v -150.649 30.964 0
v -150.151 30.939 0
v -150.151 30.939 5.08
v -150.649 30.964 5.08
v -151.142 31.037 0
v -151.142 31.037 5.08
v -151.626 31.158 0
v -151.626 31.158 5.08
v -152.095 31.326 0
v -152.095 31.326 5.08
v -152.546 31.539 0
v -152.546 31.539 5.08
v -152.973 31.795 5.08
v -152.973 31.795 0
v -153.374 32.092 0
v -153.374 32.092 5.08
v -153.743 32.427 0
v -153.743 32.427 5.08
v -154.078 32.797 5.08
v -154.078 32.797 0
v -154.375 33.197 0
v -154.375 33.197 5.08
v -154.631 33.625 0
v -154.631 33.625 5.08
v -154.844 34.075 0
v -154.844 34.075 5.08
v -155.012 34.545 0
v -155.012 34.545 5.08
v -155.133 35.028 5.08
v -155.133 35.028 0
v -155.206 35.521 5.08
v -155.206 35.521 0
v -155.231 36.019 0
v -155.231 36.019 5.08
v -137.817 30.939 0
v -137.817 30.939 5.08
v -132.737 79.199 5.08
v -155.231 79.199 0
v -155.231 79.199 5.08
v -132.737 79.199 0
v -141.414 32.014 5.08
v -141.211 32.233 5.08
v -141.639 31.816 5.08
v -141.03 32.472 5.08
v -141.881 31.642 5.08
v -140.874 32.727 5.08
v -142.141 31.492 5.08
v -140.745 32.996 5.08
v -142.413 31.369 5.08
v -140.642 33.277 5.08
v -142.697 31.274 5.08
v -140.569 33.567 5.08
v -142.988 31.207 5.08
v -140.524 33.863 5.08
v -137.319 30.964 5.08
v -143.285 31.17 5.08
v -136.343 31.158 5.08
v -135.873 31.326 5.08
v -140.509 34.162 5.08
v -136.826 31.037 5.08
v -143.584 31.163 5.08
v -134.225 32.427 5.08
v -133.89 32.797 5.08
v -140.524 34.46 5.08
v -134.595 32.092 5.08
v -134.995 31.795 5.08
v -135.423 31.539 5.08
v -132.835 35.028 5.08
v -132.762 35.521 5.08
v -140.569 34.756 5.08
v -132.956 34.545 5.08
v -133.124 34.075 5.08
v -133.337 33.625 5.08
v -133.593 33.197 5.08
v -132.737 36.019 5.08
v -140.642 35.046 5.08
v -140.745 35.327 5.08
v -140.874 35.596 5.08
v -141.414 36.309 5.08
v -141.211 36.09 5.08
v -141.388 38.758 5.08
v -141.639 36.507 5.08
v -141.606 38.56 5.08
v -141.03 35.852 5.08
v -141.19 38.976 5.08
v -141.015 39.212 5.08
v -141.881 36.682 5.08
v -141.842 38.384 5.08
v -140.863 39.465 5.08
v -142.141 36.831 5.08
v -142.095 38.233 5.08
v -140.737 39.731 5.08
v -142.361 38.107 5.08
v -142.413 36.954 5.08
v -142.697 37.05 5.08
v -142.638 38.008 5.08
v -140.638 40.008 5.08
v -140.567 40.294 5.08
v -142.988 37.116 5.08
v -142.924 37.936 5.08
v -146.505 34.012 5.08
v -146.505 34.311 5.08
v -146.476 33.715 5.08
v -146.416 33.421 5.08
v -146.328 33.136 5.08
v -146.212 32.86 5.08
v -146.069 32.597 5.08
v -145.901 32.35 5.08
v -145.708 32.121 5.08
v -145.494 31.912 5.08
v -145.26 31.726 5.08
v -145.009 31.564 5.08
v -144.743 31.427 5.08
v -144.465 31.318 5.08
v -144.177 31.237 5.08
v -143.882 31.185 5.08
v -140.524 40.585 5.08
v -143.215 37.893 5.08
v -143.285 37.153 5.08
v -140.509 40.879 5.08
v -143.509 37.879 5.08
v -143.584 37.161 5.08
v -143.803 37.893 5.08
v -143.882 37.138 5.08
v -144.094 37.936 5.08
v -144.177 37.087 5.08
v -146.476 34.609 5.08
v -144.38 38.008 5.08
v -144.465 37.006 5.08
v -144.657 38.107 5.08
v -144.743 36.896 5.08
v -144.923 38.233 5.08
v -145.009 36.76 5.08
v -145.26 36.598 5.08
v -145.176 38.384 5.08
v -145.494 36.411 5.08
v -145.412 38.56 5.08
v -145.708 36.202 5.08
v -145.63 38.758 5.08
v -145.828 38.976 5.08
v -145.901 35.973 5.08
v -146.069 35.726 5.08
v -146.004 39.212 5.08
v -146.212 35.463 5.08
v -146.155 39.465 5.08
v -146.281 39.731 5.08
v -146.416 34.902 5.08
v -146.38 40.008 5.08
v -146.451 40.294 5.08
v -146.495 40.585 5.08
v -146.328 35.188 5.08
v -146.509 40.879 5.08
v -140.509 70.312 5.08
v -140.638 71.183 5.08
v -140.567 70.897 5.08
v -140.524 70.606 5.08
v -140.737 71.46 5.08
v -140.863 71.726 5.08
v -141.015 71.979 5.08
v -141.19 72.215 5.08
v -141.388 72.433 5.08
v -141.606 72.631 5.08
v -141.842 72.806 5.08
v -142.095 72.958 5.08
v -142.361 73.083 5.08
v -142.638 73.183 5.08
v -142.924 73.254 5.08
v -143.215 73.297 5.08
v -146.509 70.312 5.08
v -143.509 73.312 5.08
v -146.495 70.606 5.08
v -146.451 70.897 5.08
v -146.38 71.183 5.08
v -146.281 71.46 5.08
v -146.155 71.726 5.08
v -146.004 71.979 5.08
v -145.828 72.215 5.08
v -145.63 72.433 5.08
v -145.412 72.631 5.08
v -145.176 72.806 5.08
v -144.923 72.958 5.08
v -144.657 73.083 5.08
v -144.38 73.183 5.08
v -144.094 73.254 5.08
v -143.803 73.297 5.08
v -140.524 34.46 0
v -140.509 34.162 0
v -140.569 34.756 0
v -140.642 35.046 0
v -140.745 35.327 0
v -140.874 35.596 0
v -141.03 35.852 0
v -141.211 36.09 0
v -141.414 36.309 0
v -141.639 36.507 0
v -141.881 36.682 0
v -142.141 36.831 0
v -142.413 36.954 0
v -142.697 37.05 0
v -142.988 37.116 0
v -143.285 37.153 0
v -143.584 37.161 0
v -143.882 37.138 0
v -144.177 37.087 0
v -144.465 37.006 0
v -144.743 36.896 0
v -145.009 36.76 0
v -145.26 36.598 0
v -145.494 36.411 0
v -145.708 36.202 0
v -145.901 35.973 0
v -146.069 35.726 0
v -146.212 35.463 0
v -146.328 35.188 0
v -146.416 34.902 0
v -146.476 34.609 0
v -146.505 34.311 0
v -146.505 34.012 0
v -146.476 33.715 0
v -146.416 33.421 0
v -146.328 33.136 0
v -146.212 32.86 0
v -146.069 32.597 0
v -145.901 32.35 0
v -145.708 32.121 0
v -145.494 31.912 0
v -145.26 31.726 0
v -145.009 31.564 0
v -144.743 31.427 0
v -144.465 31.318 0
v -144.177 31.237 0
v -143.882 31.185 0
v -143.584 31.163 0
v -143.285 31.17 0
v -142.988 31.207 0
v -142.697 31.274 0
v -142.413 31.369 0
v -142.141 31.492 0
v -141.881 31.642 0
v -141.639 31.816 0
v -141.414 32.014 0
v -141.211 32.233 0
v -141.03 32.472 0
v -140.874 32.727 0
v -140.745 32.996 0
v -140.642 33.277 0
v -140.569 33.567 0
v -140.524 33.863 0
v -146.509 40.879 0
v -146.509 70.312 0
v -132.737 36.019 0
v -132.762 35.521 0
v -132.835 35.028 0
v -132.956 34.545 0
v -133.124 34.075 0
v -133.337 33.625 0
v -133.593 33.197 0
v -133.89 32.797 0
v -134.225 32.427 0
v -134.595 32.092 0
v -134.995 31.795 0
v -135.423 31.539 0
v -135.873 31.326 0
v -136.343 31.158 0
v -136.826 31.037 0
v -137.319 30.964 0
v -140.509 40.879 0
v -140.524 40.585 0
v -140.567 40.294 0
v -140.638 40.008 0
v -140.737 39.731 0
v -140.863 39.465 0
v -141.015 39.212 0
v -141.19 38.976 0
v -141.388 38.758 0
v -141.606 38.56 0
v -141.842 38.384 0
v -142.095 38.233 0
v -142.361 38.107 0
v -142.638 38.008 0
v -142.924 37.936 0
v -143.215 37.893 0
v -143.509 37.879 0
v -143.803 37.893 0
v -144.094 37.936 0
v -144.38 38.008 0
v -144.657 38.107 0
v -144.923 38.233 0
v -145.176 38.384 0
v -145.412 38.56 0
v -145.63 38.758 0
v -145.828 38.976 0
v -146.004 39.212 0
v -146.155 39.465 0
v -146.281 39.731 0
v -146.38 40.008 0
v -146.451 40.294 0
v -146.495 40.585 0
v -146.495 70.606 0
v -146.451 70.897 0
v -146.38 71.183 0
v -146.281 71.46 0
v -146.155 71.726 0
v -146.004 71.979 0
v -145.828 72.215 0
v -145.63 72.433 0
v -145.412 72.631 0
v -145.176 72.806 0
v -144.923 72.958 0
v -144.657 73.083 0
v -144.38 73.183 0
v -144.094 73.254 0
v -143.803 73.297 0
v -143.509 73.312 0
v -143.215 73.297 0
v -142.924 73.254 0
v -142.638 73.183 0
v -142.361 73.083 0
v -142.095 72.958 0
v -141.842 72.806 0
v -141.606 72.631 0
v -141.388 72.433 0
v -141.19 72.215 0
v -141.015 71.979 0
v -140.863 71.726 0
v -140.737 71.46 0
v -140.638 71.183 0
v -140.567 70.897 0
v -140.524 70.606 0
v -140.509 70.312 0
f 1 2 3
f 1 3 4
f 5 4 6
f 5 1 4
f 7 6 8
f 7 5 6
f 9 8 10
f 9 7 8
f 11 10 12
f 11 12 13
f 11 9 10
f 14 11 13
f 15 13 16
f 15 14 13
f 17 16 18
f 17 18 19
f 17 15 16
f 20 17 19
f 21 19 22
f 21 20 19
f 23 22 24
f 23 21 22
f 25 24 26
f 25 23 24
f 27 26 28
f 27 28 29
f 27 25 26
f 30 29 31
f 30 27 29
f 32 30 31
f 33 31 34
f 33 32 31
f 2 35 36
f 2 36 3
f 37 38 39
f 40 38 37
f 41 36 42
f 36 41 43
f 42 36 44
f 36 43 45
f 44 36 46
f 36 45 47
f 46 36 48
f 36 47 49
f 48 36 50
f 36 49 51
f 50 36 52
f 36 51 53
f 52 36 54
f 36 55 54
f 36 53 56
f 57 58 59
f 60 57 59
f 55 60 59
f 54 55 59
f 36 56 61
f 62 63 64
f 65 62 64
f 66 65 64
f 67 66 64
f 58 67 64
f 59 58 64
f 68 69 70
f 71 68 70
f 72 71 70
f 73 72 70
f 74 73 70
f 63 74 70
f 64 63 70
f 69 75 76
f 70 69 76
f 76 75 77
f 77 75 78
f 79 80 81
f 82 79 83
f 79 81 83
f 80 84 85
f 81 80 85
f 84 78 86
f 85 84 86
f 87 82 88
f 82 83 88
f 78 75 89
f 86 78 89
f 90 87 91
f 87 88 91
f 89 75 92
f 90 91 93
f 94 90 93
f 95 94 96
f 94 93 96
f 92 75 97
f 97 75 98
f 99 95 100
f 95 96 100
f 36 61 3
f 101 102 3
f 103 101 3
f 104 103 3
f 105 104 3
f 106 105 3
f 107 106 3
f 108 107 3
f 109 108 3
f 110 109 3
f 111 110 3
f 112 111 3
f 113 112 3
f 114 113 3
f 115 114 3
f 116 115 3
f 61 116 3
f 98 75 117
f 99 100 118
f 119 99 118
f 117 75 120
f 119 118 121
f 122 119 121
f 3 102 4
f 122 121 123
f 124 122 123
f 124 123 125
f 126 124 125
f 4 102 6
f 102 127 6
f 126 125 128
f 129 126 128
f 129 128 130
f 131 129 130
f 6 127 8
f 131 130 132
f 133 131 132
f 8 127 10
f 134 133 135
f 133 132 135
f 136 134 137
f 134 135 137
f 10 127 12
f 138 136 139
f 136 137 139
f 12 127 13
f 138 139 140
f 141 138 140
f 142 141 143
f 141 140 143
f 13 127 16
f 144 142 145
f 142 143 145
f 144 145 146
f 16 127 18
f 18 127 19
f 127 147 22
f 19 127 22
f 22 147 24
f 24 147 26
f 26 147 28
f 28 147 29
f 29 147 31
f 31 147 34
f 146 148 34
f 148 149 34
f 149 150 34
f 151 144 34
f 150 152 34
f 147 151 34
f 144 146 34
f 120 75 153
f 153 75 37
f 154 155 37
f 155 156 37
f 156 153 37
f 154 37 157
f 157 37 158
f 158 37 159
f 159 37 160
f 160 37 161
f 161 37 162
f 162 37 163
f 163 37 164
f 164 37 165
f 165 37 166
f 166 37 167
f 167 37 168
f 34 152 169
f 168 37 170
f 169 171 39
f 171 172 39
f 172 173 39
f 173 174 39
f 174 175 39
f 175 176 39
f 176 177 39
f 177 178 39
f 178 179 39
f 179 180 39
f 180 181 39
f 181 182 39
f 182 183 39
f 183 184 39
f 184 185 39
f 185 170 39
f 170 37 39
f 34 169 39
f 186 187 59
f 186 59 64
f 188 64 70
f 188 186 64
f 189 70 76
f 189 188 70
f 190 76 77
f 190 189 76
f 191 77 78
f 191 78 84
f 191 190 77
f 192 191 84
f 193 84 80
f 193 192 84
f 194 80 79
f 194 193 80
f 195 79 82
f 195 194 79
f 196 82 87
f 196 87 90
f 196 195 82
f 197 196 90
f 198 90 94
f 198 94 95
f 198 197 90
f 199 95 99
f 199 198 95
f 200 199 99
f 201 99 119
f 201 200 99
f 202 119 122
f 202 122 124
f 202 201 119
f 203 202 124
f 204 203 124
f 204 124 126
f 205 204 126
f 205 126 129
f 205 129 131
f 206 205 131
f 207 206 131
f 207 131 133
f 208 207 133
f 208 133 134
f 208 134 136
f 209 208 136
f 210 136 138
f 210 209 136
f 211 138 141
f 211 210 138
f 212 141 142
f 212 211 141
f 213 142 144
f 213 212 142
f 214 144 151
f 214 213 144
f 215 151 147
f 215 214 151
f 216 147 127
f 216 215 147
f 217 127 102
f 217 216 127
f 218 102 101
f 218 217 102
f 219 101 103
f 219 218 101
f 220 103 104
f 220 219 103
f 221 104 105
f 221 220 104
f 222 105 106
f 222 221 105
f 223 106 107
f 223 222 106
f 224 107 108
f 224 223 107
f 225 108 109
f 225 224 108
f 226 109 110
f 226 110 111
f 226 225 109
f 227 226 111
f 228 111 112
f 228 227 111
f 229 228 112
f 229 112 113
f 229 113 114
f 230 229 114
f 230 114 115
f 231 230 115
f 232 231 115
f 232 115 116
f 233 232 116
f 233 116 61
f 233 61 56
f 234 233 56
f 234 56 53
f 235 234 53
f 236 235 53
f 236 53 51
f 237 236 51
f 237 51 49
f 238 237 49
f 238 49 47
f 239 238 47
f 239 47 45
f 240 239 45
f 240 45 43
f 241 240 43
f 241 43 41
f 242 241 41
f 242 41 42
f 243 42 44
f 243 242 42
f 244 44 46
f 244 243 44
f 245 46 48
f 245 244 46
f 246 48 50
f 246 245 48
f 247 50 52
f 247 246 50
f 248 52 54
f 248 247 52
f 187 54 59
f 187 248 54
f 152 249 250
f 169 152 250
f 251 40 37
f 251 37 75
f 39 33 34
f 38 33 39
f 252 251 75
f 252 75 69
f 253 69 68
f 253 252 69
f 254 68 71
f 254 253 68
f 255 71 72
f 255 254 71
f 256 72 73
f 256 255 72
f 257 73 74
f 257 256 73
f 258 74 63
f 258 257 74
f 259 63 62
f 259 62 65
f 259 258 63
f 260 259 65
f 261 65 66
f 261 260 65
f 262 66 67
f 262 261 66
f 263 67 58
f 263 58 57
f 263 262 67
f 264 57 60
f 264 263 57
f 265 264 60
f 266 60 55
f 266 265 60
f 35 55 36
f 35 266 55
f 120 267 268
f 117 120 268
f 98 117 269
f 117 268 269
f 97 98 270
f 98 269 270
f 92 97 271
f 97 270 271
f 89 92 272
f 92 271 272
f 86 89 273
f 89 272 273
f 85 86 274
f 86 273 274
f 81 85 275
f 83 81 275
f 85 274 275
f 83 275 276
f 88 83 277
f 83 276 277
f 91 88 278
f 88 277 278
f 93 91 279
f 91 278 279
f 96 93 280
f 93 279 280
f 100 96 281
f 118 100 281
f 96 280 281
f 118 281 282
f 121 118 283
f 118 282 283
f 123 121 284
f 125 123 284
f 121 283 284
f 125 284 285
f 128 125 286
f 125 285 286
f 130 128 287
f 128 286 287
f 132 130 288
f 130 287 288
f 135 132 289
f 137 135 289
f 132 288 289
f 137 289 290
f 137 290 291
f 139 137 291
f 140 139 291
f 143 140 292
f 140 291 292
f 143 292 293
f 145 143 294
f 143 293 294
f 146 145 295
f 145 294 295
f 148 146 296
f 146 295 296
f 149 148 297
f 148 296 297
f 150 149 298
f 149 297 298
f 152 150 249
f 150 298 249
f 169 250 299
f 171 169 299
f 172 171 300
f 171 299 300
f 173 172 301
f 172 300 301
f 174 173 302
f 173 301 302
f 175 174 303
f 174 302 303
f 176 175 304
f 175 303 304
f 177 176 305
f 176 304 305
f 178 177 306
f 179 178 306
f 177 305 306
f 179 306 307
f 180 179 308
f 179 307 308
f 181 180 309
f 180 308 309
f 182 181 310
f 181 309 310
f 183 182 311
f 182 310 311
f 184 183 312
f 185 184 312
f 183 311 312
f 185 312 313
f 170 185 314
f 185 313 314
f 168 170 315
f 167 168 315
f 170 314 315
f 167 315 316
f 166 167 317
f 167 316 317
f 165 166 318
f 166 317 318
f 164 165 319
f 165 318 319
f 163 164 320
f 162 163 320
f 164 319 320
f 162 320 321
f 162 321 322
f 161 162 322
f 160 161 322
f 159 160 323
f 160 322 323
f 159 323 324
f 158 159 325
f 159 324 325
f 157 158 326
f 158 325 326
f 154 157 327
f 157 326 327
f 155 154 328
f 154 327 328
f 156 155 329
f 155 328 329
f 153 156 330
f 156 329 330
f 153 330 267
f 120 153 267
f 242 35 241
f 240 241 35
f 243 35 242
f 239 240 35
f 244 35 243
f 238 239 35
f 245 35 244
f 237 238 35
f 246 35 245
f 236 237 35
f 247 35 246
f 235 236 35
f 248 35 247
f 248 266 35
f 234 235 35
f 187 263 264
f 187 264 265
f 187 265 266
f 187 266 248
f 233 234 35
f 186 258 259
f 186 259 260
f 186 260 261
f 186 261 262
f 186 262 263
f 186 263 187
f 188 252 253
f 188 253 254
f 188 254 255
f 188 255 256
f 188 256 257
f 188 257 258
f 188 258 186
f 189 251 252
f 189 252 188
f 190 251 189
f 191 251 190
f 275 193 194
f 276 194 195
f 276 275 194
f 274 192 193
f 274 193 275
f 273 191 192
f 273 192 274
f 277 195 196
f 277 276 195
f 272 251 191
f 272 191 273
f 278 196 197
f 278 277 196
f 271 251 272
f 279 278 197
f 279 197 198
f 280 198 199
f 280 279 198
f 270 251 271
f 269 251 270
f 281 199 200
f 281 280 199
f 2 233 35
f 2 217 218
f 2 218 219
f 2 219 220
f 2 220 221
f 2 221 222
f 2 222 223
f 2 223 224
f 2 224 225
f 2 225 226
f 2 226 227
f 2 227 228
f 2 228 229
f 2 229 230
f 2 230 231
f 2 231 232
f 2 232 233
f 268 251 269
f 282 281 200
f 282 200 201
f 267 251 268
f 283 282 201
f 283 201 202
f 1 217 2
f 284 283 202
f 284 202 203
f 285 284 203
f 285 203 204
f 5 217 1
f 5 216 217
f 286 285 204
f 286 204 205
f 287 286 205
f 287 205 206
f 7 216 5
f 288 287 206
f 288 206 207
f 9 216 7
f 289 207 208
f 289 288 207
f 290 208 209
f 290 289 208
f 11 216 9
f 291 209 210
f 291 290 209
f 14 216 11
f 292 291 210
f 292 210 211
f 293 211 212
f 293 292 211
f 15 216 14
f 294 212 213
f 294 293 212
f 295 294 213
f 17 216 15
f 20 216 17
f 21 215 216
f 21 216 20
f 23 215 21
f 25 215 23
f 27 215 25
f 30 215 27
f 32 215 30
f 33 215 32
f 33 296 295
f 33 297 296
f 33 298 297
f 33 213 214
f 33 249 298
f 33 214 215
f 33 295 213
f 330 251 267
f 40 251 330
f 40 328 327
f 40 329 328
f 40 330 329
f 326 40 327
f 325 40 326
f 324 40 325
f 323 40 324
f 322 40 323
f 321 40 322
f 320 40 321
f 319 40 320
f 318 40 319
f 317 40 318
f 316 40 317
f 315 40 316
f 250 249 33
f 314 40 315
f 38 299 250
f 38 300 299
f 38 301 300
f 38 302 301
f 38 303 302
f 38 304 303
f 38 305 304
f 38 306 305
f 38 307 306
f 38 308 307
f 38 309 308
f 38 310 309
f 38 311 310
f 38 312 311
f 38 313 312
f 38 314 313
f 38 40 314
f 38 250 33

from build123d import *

# Parameters (mm, degrees)
SKETCH1_R           = 3
BOSS_EXTRUDE1_DEPTH = 5.08


with BuildPart() as part:
    # Sketch1 → Boss-Extrude1 (new body)
    with BuildSketch(Plane.XY):
        with BuildLine():
            Line((-132.737233389, 74.11925206), (-132.737233389, 79.19925206))
            Line((-132.737233389, 79.19925206), (-155.230857378, 79.19925206))
            Line((-155.230857378, 79.19925206), (-155.230857378, 74.11925206))
            Line((-155.230857378, 74.11925206), (-155.230857378, 36.01925206))
            ThreePointArc((-155.230857378, 36.01925206), (-153.742959826, 32.427149612), (-150.150857378, 30.93925206))
            Line((-150.150857378, 30.93925206), (-137.817233389, 30.93925206))
            ThreePointArc((-137.817233389, 30.93925206), (-134.22513094, 32.427149612), (-132.737233389, 36.01925206))
            Line((-132.737233389, 36.01925206), (-132.737233389, 74.11925206))
        make_face()
        with Locations((-143.509134839, 34.161720172)):
            Circle(SKETCH1_R, mode=Mode.SUBTRACT)
        with BuildLine():
            ThreePointArc((-146.509134839, 70.311824491), (-143.509134839, 73.311824491), (-140.509134839, 70.311824491))
            Line((-140.509134839, 70.311824491), (-140.509134839, 40.878834509))
            ThreePointArc((-140.509134839, 40.878834509), (-143.509134839, 37.878834509), (-146.509134839, 40.878834509))
            Line((-146.509134839, 40.878834509), (-146.509134839, 70.311824491))
        make_face(mode=Mode.SUBTRACT)
    extrude(amount=BOSS_EXTRUDE1_DEPTH)


solid = part.part
